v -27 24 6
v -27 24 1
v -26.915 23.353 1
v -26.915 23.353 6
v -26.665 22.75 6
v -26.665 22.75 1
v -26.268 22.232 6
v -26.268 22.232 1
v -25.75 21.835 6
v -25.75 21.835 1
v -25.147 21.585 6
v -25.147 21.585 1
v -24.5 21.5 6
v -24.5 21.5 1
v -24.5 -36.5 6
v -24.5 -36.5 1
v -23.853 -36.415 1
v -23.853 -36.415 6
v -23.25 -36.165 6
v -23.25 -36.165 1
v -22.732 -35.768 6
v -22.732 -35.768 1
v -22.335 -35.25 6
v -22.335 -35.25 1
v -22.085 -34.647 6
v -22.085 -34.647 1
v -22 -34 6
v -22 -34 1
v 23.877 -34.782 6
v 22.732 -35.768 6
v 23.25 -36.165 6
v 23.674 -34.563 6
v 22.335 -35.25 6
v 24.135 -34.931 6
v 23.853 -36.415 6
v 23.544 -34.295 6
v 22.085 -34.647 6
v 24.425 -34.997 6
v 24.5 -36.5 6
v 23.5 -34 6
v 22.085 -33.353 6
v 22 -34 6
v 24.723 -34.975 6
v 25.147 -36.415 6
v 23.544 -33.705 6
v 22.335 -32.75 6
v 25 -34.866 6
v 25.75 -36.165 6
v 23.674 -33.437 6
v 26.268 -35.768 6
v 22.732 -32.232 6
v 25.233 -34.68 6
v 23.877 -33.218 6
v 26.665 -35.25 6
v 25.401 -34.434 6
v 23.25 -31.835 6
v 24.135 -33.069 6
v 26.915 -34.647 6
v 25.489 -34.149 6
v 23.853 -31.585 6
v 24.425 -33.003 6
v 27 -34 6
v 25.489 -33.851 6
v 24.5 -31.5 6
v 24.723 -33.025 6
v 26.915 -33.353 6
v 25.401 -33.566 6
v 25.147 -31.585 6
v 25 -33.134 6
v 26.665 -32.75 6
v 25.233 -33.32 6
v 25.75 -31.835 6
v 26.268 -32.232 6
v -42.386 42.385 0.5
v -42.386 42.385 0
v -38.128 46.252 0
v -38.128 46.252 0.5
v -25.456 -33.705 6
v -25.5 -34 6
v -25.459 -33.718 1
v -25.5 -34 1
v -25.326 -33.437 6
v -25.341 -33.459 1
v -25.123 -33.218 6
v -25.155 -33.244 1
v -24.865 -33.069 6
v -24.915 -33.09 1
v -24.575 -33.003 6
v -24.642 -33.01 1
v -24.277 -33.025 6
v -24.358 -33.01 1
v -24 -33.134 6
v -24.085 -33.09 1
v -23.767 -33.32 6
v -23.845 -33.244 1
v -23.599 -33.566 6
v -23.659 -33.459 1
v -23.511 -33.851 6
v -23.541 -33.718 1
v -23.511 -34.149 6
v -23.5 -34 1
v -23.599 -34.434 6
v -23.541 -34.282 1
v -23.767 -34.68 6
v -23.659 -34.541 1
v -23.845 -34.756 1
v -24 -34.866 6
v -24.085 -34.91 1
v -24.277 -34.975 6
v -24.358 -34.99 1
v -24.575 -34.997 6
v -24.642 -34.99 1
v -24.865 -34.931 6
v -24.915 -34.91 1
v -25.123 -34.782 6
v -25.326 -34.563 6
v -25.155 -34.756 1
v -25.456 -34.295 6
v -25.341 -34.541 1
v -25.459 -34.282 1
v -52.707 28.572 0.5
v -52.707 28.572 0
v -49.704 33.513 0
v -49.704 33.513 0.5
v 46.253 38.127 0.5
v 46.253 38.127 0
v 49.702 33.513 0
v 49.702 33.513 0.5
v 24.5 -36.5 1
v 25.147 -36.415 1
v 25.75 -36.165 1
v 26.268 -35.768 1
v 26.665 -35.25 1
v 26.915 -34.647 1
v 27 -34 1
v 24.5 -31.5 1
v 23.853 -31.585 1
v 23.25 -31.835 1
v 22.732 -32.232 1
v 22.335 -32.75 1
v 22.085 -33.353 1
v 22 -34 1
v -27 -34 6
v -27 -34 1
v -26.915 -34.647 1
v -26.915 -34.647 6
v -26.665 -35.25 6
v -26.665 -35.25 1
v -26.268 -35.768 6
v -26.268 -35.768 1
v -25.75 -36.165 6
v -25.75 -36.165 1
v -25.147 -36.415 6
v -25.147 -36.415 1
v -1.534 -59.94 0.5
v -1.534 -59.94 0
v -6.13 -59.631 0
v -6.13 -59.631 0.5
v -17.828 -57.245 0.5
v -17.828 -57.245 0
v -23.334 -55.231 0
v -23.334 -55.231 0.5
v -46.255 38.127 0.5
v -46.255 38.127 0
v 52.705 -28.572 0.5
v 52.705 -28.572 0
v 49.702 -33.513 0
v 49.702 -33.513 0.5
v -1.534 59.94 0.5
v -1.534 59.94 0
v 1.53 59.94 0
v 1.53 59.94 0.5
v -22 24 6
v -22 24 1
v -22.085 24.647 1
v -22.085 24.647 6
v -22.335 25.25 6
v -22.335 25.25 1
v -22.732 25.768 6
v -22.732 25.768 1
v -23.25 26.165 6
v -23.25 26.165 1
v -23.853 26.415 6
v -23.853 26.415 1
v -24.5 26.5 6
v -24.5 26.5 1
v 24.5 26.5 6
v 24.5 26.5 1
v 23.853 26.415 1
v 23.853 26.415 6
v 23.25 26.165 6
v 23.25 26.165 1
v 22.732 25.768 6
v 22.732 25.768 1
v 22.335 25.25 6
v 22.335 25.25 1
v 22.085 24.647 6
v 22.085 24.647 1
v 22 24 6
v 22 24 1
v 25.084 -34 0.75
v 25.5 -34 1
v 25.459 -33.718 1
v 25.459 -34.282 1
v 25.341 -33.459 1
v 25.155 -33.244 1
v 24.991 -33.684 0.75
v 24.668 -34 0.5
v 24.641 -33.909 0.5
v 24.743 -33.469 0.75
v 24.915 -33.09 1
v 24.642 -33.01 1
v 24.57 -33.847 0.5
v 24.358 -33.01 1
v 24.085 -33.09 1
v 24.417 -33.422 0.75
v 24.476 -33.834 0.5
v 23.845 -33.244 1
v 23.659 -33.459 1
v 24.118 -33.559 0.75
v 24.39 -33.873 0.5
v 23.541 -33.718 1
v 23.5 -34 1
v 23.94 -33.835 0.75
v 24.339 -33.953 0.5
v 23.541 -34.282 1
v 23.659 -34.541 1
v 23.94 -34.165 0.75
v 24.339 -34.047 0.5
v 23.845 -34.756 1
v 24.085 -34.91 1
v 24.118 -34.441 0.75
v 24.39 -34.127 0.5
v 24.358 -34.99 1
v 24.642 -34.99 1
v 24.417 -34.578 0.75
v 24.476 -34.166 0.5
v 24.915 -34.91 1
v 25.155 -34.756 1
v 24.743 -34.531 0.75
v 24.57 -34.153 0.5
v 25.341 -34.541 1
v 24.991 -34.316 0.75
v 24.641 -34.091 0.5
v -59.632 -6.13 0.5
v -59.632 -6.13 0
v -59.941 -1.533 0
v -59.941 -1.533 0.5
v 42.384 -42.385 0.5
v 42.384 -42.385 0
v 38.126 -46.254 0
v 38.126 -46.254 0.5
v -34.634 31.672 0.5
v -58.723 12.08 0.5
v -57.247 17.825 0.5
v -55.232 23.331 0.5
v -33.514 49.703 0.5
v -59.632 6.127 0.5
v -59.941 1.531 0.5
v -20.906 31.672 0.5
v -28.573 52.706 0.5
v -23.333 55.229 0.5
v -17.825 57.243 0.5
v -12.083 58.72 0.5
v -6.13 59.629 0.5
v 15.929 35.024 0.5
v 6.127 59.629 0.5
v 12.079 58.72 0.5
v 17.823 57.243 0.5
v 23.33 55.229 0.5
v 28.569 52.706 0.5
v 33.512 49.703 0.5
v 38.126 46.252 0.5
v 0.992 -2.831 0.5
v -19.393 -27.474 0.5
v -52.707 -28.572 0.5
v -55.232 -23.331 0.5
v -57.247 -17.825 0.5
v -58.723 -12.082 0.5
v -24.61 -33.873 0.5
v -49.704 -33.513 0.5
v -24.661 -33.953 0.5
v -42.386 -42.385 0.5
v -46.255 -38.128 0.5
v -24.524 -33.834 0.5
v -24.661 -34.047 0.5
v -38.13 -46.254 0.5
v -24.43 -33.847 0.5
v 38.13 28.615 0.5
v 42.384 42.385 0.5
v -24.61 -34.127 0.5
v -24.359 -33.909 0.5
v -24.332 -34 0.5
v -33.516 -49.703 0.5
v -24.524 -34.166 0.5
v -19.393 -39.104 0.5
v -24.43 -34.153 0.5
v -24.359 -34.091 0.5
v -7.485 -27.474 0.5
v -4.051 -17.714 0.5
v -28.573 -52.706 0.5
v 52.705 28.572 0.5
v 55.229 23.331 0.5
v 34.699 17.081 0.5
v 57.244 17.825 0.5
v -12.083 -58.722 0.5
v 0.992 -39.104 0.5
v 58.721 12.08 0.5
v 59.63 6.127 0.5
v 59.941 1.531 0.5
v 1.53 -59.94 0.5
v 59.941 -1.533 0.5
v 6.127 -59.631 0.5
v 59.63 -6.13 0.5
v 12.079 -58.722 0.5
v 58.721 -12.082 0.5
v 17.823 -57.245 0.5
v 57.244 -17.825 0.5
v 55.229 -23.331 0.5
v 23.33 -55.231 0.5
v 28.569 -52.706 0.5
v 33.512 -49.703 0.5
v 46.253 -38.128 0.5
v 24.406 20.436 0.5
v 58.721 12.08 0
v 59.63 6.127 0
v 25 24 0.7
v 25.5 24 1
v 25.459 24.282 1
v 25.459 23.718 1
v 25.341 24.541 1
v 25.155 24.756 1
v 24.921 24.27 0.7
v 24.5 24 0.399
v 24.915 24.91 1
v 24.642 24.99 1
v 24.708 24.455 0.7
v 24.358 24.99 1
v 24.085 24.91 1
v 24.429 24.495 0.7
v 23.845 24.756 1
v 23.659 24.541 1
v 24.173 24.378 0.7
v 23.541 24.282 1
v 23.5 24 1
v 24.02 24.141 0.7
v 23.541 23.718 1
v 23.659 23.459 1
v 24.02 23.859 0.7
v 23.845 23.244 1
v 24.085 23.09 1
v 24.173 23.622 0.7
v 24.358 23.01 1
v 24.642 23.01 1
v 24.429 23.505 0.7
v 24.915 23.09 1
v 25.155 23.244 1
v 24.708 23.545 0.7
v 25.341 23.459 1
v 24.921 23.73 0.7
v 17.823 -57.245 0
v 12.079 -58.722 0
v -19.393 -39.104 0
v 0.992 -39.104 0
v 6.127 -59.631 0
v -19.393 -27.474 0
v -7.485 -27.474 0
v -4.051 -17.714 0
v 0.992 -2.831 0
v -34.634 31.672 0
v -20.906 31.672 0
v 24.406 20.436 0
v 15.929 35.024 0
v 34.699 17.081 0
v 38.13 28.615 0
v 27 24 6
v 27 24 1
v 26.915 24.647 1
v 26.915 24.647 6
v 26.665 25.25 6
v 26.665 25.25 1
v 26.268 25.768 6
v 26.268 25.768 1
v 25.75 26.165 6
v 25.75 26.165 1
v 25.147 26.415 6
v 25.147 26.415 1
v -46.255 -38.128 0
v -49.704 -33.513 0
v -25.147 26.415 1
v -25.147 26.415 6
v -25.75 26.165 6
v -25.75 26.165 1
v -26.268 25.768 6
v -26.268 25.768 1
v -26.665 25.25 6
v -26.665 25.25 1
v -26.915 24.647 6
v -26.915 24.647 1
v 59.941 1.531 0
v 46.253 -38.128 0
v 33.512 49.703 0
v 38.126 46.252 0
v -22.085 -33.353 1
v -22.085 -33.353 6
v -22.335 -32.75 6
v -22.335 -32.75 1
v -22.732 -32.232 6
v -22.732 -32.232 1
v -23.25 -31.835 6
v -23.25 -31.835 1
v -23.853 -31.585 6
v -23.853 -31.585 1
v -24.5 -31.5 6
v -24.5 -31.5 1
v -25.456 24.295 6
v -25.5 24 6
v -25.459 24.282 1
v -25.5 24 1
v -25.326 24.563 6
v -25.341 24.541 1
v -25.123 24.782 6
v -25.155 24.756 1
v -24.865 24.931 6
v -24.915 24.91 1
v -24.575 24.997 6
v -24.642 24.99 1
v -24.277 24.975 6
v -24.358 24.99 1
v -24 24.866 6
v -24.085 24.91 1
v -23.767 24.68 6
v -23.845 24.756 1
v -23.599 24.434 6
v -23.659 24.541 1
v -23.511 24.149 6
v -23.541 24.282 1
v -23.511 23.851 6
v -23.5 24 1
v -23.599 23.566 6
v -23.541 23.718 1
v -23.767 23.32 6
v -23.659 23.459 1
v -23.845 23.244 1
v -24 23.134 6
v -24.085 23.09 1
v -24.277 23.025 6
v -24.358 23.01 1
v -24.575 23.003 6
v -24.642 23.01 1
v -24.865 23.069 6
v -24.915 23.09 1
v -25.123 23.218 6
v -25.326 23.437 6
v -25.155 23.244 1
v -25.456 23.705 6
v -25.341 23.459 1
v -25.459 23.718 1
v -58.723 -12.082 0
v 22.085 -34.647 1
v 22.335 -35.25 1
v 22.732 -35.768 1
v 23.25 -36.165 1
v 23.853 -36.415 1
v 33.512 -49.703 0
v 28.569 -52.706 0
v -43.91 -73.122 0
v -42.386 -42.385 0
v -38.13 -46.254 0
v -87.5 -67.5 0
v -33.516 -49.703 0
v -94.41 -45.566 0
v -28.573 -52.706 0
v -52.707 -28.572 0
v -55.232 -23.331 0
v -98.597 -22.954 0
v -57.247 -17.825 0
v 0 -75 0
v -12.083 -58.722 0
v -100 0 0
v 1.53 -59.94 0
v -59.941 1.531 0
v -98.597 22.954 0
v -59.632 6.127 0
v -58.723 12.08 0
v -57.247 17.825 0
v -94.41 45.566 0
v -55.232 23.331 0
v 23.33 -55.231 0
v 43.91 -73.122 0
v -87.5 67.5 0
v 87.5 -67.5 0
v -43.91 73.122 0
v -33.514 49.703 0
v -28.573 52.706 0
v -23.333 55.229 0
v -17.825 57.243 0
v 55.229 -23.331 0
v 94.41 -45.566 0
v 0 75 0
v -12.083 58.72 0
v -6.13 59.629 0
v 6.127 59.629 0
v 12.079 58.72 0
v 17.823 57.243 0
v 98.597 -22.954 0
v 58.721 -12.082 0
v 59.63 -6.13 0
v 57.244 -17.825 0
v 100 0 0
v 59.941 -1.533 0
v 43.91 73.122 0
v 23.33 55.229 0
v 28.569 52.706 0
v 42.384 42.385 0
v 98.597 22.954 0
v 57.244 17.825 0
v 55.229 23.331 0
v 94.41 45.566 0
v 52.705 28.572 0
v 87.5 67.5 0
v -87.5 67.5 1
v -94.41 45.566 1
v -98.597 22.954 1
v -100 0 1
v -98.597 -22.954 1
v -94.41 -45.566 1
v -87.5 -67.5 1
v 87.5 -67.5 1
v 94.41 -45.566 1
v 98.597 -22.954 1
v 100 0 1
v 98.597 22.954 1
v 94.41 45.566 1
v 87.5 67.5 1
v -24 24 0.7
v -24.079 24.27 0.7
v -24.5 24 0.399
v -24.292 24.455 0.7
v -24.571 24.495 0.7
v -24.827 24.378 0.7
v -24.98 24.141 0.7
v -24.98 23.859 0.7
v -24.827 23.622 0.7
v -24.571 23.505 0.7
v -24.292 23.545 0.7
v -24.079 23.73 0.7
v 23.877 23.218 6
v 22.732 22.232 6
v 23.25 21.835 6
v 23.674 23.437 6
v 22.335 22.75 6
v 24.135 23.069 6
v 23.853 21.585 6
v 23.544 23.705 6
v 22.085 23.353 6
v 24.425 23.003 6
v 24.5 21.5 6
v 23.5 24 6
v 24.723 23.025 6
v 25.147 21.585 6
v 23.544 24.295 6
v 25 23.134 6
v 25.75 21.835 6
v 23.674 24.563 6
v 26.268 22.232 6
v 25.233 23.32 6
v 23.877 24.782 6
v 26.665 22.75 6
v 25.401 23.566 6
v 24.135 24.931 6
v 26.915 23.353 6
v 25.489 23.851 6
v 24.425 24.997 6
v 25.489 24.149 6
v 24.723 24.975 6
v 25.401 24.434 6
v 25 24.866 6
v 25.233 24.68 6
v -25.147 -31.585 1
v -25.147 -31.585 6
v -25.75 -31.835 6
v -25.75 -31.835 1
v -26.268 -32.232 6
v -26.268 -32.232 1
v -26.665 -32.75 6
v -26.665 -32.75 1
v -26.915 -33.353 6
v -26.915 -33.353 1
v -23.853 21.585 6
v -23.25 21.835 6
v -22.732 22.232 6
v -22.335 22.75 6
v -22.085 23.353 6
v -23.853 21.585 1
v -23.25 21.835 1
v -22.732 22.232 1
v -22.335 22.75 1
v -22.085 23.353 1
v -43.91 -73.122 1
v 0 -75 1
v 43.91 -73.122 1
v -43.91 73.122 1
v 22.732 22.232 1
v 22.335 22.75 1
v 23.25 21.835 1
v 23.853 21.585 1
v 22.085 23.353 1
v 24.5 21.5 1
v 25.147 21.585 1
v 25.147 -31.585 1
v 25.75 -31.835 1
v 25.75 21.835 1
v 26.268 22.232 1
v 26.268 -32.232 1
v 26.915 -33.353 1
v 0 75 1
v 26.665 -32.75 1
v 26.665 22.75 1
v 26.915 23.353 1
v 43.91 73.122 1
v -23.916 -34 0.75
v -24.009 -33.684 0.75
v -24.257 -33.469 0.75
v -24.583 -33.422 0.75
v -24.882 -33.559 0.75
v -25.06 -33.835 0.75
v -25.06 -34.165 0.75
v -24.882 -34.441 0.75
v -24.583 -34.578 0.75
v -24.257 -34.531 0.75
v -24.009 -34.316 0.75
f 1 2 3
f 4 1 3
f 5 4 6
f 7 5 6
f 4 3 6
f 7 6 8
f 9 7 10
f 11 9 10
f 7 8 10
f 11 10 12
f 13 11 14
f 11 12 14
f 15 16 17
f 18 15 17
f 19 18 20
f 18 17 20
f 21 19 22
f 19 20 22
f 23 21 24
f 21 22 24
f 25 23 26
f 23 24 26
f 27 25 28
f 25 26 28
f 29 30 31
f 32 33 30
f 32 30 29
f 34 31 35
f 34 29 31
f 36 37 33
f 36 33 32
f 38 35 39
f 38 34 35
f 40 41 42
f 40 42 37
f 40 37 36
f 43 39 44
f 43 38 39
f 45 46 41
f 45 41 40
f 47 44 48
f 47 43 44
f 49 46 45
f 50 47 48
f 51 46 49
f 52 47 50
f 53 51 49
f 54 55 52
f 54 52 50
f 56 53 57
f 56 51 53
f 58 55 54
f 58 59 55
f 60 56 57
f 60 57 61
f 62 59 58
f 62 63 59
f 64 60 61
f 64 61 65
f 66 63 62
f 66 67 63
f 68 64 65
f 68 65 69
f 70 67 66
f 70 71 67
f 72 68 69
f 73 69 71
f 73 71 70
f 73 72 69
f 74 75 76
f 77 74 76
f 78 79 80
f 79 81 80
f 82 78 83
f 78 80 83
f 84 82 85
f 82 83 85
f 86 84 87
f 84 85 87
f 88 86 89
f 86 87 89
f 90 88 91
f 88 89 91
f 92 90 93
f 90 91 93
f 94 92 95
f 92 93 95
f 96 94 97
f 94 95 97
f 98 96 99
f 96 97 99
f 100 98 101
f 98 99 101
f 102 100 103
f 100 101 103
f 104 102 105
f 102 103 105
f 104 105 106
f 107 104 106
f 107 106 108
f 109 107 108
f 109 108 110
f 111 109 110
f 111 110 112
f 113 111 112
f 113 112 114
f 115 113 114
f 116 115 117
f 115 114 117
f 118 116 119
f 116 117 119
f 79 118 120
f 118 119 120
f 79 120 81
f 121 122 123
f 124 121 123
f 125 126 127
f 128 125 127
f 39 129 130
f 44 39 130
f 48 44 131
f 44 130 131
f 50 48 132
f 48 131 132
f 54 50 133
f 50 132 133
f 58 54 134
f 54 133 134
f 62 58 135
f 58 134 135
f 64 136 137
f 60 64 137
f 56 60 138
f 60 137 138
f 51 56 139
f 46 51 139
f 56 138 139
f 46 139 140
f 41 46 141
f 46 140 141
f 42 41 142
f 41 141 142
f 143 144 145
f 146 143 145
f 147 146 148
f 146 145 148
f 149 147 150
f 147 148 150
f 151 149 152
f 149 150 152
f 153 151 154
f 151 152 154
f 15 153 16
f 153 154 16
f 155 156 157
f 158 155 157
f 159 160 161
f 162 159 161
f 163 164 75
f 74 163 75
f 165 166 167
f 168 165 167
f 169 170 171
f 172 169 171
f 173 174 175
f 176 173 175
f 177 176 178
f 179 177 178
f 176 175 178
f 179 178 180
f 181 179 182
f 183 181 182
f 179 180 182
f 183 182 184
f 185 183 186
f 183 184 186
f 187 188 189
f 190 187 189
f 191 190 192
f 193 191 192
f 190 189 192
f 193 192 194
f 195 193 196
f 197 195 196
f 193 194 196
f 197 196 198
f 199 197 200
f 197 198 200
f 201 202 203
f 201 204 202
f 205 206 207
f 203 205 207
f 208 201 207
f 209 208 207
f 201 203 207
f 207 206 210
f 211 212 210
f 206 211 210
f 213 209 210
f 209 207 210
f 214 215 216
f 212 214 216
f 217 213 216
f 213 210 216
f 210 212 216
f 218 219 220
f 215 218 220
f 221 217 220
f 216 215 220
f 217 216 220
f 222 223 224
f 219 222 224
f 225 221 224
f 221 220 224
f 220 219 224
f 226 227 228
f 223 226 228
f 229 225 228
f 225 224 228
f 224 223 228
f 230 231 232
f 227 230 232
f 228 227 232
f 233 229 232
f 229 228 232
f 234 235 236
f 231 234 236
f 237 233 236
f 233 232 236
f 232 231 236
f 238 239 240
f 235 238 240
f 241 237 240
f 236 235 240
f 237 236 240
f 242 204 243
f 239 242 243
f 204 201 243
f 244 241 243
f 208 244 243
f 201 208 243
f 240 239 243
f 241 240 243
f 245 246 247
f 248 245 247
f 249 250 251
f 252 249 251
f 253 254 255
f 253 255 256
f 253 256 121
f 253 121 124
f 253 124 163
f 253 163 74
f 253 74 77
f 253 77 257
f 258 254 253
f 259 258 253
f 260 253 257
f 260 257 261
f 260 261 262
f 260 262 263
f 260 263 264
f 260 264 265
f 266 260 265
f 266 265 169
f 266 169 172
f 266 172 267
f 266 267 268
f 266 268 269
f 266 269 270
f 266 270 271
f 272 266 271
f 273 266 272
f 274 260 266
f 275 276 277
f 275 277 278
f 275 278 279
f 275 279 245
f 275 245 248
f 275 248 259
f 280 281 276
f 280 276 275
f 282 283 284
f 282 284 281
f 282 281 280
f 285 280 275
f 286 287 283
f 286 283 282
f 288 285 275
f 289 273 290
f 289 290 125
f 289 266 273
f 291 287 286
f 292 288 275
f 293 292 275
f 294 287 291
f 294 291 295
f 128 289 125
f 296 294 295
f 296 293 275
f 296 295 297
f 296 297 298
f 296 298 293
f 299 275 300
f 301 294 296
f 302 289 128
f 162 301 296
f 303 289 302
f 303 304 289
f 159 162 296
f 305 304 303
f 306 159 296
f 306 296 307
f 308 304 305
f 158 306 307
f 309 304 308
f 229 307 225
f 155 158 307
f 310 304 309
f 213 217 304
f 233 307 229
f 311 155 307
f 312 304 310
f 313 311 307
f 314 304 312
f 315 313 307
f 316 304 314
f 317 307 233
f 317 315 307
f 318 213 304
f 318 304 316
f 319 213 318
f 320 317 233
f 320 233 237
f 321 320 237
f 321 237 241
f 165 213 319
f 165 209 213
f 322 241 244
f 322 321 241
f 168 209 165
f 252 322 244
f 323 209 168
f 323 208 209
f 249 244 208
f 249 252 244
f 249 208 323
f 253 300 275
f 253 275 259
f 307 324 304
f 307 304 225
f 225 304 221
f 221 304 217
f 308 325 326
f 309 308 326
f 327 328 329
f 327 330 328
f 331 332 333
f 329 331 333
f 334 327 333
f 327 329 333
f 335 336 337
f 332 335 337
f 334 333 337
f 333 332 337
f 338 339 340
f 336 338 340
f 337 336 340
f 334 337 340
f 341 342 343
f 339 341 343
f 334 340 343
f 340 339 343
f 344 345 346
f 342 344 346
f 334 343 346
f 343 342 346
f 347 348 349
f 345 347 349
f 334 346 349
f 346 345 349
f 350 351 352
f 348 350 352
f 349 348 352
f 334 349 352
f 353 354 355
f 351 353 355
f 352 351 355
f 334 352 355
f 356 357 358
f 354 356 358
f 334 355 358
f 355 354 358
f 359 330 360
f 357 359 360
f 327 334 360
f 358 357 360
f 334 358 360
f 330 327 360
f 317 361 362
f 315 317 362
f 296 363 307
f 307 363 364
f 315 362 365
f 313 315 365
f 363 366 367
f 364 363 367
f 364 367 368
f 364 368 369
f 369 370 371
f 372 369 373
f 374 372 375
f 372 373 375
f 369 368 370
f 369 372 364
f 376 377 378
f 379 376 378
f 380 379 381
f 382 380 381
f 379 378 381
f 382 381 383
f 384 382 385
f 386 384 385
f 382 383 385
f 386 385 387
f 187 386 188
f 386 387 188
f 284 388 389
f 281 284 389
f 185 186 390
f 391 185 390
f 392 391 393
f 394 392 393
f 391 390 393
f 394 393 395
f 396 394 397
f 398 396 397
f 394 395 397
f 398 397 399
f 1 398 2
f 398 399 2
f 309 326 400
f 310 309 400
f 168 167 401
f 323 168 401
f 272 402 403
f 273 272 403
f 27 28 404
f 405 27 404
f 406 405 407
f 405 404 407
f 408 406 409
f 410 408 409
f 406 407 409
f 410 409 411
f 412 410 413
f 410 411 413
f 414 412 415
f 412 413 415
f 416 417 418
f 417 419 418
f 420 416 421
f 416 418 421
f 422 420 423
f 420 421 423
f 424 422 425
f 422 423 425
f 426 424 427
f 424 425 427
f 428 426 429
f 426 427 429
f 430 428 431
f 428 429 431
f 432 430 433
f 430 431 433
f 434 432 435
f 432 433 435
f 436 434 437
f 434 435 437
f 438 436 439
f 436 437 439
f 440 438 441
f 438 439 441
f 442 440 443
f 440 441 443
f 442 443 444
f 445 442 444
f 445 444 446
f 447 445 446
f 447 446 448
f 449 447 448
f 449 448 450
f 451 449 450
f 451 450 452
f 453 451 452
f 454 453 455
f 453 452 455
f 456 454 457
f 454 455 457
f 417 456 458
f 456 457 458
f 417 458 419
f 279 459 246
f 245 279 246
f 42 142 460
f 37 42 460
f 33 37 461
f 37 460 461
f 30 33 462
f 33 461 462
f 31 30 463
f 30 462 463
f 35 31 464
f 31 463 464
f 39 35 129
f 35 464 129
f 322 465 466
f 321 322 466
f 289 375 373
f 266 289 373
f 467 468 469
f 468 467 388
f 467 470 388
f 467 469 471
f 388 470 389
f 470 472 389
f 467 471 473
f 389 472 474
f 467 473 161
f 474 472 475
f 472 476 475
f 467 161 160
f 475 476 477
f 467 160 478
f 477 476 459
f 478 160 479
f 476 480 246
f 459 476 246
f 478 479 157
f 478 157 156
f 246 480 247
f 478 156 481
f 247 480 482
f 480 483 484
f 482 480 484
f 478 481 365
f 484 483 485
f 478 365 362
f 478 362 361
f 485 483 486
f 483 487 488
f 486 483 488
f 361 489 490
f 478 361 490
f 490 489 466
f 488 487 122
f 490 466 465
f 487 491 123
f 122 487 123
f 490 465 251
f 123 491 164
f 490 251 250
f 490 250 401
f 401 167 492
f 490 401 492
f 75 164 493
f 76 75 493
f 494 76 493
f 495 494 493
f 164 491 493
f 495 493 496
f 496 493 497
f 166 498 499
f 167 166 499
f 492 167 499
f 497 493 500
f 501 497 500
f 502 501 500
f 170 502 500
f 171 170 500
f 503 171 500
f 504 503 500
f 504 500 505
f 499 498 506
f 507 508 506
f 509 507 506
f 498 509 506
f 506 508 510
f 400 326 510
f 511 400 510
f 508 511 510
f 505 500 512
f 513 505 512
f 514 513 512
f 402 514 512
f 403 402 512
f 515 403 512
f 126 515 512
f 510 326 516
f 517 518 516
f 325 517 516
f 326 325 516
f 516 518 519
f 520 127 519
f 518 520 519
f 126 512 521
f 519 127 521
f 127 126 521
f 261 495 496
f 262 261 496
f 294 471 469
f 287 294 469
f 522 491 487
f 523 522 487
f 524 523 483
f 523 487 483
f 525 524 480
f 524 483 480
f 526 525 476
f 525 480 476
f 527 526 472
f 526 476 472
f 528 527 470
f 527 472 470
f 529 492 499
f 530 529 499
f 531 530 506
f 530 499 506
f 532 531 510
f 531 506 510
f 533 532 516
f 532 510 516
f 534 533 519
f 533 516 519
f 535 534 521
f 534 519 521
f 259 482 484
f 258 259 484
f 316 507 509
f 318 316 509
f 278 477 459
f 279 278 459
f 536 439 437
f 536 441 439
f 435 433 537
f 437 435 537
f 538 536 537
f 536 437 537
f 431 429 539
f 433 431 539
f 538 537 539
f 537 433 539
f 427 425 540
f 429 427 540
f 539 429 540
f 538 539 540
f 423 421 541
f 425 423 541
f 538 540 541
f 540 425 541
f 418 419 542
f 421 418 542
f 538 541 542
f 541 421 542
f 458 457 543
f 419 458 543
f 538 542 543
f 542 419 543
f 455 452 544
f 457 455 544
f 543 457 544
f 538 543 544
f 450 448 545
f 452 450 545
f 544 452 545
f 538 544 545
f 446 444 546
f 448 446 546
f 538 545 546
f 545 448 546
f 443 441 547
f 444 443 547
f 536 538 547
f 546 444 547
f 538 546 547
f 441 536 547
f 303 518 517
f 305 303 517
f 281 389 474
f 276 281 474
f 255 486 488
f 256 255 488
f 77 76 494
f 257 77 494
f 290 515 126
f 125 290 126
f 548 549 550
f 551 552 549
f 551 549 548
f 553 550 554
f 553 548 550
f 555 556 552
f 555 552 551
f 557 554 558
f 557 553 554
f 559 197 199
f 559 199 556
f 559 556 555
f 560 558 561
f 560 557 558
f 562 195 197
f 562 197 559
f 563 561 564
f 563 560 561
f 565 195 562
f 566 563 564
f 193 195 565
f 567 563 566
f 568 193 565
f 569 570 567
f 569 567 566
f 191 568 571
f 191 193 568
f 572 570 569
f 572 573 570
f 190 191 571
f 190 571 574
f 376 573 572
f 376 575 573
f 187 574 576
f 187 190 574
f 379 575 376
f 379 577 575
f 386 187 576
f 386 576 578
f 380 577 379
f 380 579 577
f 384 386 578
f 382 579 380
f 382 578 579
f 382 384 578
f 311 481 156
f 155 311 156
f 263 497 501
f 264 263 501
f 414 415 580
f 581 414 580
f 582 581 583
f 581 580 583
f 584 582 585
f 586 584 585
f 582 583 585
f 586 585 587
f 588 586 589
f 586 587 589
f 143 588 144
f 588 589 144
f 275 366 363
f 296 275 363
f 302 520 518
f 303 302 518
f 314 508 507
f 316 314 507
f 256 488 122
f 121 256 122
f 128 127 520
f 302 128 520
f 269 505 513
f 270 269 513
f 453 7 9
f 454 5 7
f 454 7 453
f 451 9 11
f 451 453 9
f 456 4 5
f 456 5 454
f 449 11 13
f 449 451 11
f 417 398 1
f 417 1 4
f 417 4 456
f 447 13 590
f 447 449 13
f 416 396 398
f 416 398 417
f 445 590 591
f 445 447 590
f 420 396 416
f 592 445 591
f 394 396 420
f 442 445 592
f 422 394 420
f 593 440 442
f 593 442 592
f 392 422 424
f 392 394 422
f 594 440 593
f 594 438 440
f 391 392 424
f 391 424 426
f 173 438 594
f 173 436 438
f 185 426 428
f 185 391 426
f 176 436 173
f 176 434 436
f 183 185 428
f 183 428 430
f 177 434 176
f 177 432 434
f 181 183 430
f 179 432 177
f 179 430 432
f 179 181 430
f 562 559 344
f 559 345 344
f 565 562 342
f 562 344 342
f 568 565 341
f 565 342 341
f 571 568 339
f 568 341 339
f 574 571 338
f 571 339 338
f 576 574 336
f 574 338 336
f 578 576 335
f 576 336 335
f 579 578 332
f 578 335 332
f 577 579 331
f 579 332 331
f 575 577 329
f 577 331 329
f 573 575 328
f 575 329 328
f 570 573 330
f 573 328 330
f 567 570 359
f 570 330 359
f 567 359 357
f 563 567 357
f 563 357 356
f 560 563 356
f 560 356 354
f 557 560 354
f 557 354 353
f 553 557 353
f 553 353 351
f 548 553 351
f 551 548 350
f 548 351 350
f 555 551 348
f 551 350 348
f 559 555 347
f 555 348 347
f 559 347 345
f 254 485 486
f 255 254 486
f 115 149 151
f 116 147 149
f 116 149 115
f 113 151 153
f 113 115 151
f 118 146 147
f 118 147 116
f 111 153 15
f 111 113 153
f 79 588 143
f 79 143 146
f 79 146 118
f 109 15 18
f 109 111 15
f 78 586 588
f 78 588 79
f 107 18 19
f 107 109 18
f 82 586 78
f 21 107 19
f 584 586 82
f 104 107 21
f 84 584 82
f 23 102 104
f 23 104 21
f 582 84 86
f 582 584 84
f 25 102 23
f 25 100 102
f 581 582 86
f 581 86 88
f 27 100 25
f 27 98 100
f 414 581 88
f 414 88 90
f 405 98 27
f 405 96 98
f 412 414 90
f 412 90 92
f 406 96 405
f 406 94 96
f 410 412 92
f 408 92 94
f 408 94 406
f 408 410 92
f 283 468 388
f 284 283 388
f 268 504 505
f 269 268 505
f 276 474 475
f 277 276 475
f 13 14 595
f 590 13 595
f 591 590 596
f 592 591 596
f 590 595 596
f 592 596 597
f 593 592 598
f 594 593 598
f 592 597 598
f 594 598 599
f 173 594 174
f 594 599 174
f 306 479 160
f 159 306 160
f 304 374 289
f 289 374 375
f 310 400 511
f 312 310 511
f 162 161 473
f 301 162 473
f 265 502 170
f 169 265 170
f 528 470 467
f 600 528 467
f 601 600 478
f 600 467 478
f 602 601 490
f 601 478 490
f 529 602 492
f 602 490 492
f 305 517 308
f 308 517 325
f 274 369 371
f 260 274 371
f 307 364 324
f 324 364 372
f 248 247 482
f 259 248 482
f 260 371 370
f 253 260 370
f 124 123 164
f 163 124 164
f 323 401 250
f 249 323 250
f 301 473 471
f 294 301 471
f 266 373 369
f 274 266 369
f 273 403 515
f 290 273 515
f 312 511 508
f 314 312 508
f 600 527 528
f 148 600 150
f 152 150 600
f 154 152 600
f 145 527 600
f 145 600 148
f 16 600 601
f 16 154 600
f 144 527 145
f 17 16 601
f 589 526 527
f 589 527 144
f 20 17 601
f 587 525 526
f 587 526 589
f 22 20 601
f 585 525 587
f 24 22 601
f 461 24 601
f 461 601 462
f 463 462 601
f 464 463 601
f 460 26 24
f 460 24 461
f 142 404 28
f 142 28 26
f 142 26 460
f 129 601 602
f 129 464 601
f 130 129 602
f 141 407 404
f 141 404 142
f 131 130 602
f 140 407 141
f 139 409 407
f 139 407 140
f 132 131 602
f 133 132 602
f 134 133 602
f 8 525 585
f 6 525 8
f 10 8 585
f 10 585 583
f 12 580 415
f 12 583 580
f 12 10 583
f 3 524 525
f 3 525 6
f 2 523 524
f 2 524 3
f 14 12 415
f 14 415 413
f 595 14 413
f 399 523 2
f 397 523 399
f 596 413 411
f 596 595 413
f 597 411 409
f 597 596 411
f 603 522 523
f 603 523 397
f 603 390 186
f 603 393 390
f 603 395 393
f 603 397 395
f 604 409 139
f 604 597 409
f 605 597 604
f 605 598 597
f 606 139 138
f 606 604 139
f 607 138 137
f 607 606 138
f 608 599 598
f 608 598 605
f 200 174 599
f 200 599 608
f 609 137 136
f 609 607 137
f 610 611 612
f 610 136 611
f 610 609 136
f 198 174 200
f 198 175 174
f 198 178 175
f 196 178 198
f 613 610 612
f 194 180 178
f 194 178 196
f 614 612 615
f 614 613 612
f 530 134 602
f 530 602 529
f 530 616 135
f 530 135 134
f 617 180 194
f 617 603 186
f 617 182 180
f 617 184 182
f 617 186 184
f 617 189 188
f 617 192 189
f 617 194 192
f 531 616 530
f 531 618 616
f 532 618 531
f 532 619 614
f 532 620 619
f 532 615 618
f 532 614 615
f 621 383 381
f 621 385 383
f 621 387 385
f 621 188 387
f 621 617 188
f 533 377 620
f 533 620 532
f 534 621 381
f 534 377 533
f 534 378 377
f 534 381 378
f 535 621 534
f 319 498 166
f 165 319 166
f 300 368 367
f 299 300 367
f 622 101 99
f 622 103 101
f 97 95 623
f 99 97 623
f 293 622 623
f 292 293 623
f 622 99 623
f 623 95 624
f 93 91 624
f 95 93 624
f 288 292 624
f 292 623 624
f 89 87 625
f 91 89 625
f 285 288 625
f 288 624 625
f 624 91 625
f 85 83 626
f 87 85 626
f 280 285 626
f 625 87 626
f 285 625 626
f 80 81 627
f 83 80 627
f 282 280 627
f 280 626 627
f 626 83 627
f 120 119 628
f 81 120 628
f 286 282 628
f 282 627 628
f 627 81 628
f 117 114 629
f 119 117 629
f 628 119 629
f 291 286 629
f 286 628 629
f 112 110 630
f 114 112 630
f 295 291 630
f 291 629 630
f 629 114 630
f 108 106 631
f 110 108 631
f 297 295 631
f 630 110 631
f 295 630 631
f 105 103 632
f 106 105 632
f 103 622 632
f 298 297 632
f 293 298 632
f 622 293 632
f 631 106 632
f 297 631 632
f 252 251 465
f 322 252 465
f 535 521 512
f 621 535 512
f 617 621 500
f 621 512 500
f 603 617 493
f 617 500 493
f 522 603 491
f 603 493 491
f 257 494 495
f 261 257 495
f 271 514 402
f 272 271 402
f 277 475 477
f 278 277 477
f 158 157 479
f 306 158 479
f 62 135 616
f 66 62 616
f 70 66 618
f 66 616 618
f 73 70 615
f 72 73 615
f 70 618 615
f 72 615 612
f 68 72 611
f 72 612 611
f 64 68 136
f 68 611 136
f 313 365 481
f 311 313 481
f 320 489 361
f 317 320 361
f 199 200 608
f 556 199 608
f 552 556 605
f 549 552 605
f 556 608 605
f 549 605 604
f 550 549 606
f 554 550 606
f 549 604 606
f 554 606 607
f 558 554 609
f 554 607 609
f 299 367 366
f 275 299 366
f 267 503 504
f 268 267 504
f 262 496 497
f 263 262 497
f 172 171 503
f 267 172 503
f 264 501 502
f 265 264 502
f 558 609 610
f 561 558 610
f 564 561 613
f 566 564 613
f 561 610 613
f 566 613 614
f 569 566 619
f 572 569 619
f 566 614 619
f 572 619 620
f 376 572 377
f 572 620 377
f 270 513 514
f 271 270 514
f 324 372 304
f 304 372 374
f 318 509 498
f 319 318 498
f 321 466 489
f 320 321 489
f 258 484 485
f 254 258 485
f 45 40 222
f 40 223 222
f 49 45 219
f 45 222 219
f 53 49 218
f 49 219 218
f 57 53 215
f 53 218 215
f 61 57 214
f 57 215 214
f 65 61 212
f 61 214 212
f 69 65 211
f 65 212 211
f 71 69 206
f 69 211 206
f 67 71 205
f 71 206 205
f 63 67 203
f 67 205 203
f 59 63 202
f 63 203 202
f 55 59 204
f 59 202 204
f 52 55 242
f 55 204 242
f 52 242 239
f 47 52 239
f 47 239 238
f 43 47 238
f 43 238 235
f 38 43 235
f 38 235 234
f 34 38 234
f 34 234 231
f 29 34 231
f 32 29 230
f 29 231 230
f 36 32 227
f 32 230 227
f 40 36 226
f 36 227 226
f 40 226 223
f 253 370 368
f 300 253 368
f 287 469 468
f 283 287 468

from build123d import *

# Parameters (mm, degrees)
F1_DEPTH        = 1
F3_DEPTH        = 0.5
F5_DEPTH        = 5
F10_D           = 2
F10_DEPTH       = 5
F10_TIP         = 0.600860619
F10_ON_F7_D     = 2
F10_ON_F7_DEPTH = 5
F10_ON_F7_TIP   = 0.600860619
F10_ON_F8_D     = 2
F10_ON_F8_DEPTH = 5
F10_ON_F8_TIP   = 0.600860619
F10_ON_F9_D     = 2
F10_ON_F9_DEPTH = 5
F10_ON_F9_TIP   = 0.600860619


# Not quite as in the source:
# - ends of sketch curves that miss each other by under 0.0002 mm in the source are joined


with BuildPart() as f1:
    # F0 (on Top) → F1 (new body)
    with BuildSketch(Plane.XY):
        with BuildLine():
            ThreePointArc((87.5, -67.5), (100, 0), (87.5, 67.5))
            ThreePointArc((87.5, 67.5), (0, 75), (-87.5, 67.5))
            ThreePointArc((-87.5, 67.5), (-100, 0), (-87.5, -67.5))
            ThreePointArc((-87.5, -67.5), (0, -75), (87.5, -67.5))
        make_face()
    extrude(amount=F1_DEPTH)

    # F2 (on face) → F3 (cut)
    with BuildSketch(Plane(origin=(0, 0, 0), x_dir=(1, 0, 0), z_dir=(0, 0, -1))):
        Polygon((59.9405638027, -1.5313209672), (59.9405638027, -3.714e-05), (59.9405638027, 1.5331036891), (59.6300730728, 6.1295549733), (58.7212563071, 12.0819890983), (57.2441969375, 17.8245820004), (55.2293497966, 23.3313356518), (52.7045699138, 28.5721666207), (49.7021691234, 33.5132774711), (46.2529736583, 38.1275559743), (42.3840957472, 42.3849186981), (38.126361623, 46.2537966092), (33.5117117195, 49.7033634747), (28.5691152675, 52.705764265), (23.3301413005, 55.2305441479), (17.8233876491, 57.2453912888), (12.078937745, 58.7224506584), (6.1268750204, 59.6308960237), (1.5300523358, 59.9395297516), (-0.0008600909, 59.9395297516), (-1.5343723204, 59.9395297516), (-6.1304522042, 59.6308960237), (-12.0828863293, 58.7224506584), (-17.8277076337, 57.2453912888), (-23.3344612852, 55.2305441479), (-28.5734352521, 52.705764265), (-33.5160317041, 49.7033634747), (-38.1304216273, 46.2537966092), (-42.3860387693, 42.3849186981), (-46.2548052603, 38.1275559743), (-49.7044464059, 33.5132774711), (-52.7068100562, 28.5721666207), (-55.2315527989, 23.3313356518), (-57.24651136, 17.8245820004), (-58.7234964495, 12.0819890983), (-59.6322389351, 6.1295549733), (-59.9405384027, 1.5331036891), (-59.9405384027, -3.714e-05), (-59.9405384027, -1.5313209672), (-59.6322389351, -6.127400851), (-58.7234964495, -12.079834976), (-57.24651136, -17.8246562804), (-55.2315527989, -23.3314099319), (-52.7068100562, -28.5722409008), (-49.7044464059, -33.5130917709), (-46.2548052603, -38.1273702741), (-42.3860387693, -42.3850672583), (-38.1284160652, -46.251753907), (-33.5141747021, -49.7034748948), (-28.5734352521, -52.705764265), (-23.3326042832, -55.2285014457), (-17.8254792313, -57.2434600068), (-12.0828863293, -58.7204450962), (-6.1304522042, -59.6291875818), (-1.5343723204, -59.9395297516), (-0.0008600909, -59.9395297516), (1.5300523358, -59.9395297516), (6.1268750204, -59.6291875818), (12.078937745, -58.7204450962), (17.8233876491, -57.2434600068), (23.3301413005, -55.2285014457), (28.5691152675, -52.705764265), (33.5117117195, -49.7034748948), (38.126361623, -46.251753907), (42.3840957472, -42.3850672583), (46.2529736583, -38.1273702741), (49.7021691234, -33.5130917709), (52.7045699138, -28.5722409008), (55.2293497966, -23.3314099319), (57.2441969375, -17.8246562804), (58.7212563071, -12.079834976), (59.6300730728, -6.127400851), align=None)
        Polygon((38.1304470273, -28.6145805458), (15.9292456364, -35.0243199768), (0.9922645644, 2.8311480684), (-20.9062448628, -31.6715753619), (-34.6344668525, -31.6715771942), (-4.051352795, 17.7139046828), (-7.4845780431, 27.4743070541), (-19.3931602971, 27.4743070541), (-19.3931602971, 39.1043390122), (0.9922645644, 39.1043390122), (24.4064596442, -20.4359724552), (34.6987073808, -17.08074129), align=None, mode=Mode.SUBTRACT)
    extrude(amount=-F3_DEPTH, mode=Mode.SUBTRACT)

    # F4 (on face) → F5 (join)
    with BuildSketch(Plane.XY.offset(1)):
        with BuildLine():
            ThreePointArc((-24.5, -31.5), (-26.267766953, -32.232233047), (-27, -34))
            Line((-27, -34), (-24.5, -34))
            Line((-24.5, -34), (-24.5, -31.5))
        make_face()
        with BuildLine():
            Line((-24.5, -31.5), (-24.5, -34))
            Line((-24.5, -34), (-22, -34))
            ThreePointArc((-22, -34), (-22.732233047, -32.232233047), (-24.5, -31.5))
        make_face()
        with BuildLine():
            Line((-22, -34), (-24.5, -34))
            Line((-24.5, -34), (-24.5, -36.5))
            ThreePointArc((-24.5, -36.5), (-22.732233047, -35.767766953), (-22, -34))
        make_face()
        with BuildLine():
            Line((-24.5, -34), (-27, -34))
            ThreePointArc((-27, -34), (-26.267766953, -35.767766953), (-24.5, -36.5))
            Line((-24.5, -36.5), (-24.5, -34))
        make_face()
        with BuildLine():
            Line((-24.5, 24), (-24.5, 26.5))
            ThreePointArc((-24.5, 26.5), (-26.267766953, 25.767766953), (-27, 24))
            Line((-27, 24), (-24.5, 24))
        make_face()
        with BuildLine():
            Line((-24.5, 24), (-27, 24))
            ThreePointArc((-27, 24), (-26.267766953, 22.232233047), (-24.5, 21.5))
            Line((-24.5, 21.5), (-24.5, 24))
        make_face()
        with BuildLine():
            ThreePointArc((-22, 24), (-22.732233047, 25.767766953), (-24.5, 26.5))
            Line((-24.5, 26.5), (-24.5, 24))
            Line((-24.5, 24), (-22, 24))
        make_face()
        with BuildLine():
            Line((-22, 24), (-24.5, 24))
            Line((-24.5, 24), (-24.5, 21.5))
            ThreePointArc((-24.5, 21.5), (-22.732233047, 22.232233047), (-22, 24))
        make_face()
        with BuildLine():
            Line((24.5, -34), (24.5, -31.5))
            ThreePointArc((24.5, -31.5), (22.732233047, -32.232233047), (22, -34))
            Line((22, -34), (24.5, -34))
        make_face()
        with BuildLine():
            ThreePointArc((22, -34), (22.732233047, -35.767766953), (24.5, -36.5))
            Line((24.5, -36.5), (24.5, -34))
            Line((24.5, -34), (22, -34))
        make_face()
        with BuildLine():
            Line((24.5, -34), (27, -34))
            ThreePointArc((27, -34), (26.267766953, -32.232233047), (24.5, -31.5))
            Line((24.5, -31.5), (24.5, -34))
        make_face()
        with BuildLine():
            ThreePointArc((24.5, -36.5), (26.267766953, -35.767766953), (27, -34))
            Line((27, -34), (24.5, -34))
            Line((24.5, -34), (24.5, -36.5))
        make_face()
        with BuildLine():
            Line((24.5, 24), (24.5, 26.5))
            ThreePointArc((24.5, 26.5), (22.732233047, 25.767766953), (22, 24))
            Line((22, 24), (24.5, 24))
        make_face()
        with BuildLine():
            ThreePointArc((27, 24), (26.267766953, 25.767766953), (24.5, 26.5))
            Line((24.5, 26.5), (24.5, 24))
            Line((24.5, 24), (27, 24))
        make_face()
        with BuildLine():
            Line((27, 24), (24.5, 24))
            Line((24.5, 24), (24.5, 21.5))
            ThreePointArc((24.5, 21.5), (26.267766953, 22.232233047), (27, 24))
        make_face()
        with BuildLine():
            Line((24.5, 21.5), (24.5, 24))
            Line((24.5, 24), (22, 24))
            ThreePointArc((22, 24), (22.732233047, 22.232233047), (24.5, 21.5))
        make_face()
    extrude(amount=F5_DEPTH)

    # F10
    with Locations(Plane.XY.offset(6)):
        with Locations((-24.5, 24)):
            Hole(F10_D / 2, depth=F10_DEPTH)
            with Locations((0, 0, -(F10_DEPTH + F10_TIP / 2))):  # 118° drill point
                Cone(0, F10_D / 2, F10_TIP, mode=Mode.SUBTRACT)

    # F10 on F7
    with Locations(Plane.XY.offset(6)):
        with Locations((24.5, 24)):
            Hole(F10_ON_F7_D / 2, depth=F10_ON_F7_DEPTH)
            with Locations((0, 0, -(F10_ON_F7_DEPTH + F10_ON_F7_TIP / 2))):  # 118° drill point
                Cone(0, F10_ON_F7_D / 2, F10_ON_F7_TIP, mode=Mode.SUBTRACT)

    # F10 on F8
    with Locations(Plane.XY.offset(6)):
        with Locations((-24.5, -34)):
            Hole(F10_ON_F8_D / 2, depth=F10_ON_F8_DEPTH)
            with Locations((0, 0, -(F10_ON_F8_DEPTH + F10_ON_F8_TIP / 2))):  # 118° drill point
                Cone(0, F10_ON_F8_D / 2, F10_ON_F8_TIP, mode=Mode.SUBTRACT)

    # F10 on F9
    with Locations(Plane.XY.offset(6)):
        with Locations((24.5, -34)):
            Hole(F10_ON_F9_D / 2, depth=F10_ON_F9_DEPTH)
            with Locations((0, 0, -(F10_ON_F9_DEPTH + F10_ON_F9_TIP / 2))):  # 118° drill point
                Cone(0, F10_ON_F9_D / 2, F10_ON_F9_TIP, mode=Mode.SUBTRACT)


solid = f1.part
